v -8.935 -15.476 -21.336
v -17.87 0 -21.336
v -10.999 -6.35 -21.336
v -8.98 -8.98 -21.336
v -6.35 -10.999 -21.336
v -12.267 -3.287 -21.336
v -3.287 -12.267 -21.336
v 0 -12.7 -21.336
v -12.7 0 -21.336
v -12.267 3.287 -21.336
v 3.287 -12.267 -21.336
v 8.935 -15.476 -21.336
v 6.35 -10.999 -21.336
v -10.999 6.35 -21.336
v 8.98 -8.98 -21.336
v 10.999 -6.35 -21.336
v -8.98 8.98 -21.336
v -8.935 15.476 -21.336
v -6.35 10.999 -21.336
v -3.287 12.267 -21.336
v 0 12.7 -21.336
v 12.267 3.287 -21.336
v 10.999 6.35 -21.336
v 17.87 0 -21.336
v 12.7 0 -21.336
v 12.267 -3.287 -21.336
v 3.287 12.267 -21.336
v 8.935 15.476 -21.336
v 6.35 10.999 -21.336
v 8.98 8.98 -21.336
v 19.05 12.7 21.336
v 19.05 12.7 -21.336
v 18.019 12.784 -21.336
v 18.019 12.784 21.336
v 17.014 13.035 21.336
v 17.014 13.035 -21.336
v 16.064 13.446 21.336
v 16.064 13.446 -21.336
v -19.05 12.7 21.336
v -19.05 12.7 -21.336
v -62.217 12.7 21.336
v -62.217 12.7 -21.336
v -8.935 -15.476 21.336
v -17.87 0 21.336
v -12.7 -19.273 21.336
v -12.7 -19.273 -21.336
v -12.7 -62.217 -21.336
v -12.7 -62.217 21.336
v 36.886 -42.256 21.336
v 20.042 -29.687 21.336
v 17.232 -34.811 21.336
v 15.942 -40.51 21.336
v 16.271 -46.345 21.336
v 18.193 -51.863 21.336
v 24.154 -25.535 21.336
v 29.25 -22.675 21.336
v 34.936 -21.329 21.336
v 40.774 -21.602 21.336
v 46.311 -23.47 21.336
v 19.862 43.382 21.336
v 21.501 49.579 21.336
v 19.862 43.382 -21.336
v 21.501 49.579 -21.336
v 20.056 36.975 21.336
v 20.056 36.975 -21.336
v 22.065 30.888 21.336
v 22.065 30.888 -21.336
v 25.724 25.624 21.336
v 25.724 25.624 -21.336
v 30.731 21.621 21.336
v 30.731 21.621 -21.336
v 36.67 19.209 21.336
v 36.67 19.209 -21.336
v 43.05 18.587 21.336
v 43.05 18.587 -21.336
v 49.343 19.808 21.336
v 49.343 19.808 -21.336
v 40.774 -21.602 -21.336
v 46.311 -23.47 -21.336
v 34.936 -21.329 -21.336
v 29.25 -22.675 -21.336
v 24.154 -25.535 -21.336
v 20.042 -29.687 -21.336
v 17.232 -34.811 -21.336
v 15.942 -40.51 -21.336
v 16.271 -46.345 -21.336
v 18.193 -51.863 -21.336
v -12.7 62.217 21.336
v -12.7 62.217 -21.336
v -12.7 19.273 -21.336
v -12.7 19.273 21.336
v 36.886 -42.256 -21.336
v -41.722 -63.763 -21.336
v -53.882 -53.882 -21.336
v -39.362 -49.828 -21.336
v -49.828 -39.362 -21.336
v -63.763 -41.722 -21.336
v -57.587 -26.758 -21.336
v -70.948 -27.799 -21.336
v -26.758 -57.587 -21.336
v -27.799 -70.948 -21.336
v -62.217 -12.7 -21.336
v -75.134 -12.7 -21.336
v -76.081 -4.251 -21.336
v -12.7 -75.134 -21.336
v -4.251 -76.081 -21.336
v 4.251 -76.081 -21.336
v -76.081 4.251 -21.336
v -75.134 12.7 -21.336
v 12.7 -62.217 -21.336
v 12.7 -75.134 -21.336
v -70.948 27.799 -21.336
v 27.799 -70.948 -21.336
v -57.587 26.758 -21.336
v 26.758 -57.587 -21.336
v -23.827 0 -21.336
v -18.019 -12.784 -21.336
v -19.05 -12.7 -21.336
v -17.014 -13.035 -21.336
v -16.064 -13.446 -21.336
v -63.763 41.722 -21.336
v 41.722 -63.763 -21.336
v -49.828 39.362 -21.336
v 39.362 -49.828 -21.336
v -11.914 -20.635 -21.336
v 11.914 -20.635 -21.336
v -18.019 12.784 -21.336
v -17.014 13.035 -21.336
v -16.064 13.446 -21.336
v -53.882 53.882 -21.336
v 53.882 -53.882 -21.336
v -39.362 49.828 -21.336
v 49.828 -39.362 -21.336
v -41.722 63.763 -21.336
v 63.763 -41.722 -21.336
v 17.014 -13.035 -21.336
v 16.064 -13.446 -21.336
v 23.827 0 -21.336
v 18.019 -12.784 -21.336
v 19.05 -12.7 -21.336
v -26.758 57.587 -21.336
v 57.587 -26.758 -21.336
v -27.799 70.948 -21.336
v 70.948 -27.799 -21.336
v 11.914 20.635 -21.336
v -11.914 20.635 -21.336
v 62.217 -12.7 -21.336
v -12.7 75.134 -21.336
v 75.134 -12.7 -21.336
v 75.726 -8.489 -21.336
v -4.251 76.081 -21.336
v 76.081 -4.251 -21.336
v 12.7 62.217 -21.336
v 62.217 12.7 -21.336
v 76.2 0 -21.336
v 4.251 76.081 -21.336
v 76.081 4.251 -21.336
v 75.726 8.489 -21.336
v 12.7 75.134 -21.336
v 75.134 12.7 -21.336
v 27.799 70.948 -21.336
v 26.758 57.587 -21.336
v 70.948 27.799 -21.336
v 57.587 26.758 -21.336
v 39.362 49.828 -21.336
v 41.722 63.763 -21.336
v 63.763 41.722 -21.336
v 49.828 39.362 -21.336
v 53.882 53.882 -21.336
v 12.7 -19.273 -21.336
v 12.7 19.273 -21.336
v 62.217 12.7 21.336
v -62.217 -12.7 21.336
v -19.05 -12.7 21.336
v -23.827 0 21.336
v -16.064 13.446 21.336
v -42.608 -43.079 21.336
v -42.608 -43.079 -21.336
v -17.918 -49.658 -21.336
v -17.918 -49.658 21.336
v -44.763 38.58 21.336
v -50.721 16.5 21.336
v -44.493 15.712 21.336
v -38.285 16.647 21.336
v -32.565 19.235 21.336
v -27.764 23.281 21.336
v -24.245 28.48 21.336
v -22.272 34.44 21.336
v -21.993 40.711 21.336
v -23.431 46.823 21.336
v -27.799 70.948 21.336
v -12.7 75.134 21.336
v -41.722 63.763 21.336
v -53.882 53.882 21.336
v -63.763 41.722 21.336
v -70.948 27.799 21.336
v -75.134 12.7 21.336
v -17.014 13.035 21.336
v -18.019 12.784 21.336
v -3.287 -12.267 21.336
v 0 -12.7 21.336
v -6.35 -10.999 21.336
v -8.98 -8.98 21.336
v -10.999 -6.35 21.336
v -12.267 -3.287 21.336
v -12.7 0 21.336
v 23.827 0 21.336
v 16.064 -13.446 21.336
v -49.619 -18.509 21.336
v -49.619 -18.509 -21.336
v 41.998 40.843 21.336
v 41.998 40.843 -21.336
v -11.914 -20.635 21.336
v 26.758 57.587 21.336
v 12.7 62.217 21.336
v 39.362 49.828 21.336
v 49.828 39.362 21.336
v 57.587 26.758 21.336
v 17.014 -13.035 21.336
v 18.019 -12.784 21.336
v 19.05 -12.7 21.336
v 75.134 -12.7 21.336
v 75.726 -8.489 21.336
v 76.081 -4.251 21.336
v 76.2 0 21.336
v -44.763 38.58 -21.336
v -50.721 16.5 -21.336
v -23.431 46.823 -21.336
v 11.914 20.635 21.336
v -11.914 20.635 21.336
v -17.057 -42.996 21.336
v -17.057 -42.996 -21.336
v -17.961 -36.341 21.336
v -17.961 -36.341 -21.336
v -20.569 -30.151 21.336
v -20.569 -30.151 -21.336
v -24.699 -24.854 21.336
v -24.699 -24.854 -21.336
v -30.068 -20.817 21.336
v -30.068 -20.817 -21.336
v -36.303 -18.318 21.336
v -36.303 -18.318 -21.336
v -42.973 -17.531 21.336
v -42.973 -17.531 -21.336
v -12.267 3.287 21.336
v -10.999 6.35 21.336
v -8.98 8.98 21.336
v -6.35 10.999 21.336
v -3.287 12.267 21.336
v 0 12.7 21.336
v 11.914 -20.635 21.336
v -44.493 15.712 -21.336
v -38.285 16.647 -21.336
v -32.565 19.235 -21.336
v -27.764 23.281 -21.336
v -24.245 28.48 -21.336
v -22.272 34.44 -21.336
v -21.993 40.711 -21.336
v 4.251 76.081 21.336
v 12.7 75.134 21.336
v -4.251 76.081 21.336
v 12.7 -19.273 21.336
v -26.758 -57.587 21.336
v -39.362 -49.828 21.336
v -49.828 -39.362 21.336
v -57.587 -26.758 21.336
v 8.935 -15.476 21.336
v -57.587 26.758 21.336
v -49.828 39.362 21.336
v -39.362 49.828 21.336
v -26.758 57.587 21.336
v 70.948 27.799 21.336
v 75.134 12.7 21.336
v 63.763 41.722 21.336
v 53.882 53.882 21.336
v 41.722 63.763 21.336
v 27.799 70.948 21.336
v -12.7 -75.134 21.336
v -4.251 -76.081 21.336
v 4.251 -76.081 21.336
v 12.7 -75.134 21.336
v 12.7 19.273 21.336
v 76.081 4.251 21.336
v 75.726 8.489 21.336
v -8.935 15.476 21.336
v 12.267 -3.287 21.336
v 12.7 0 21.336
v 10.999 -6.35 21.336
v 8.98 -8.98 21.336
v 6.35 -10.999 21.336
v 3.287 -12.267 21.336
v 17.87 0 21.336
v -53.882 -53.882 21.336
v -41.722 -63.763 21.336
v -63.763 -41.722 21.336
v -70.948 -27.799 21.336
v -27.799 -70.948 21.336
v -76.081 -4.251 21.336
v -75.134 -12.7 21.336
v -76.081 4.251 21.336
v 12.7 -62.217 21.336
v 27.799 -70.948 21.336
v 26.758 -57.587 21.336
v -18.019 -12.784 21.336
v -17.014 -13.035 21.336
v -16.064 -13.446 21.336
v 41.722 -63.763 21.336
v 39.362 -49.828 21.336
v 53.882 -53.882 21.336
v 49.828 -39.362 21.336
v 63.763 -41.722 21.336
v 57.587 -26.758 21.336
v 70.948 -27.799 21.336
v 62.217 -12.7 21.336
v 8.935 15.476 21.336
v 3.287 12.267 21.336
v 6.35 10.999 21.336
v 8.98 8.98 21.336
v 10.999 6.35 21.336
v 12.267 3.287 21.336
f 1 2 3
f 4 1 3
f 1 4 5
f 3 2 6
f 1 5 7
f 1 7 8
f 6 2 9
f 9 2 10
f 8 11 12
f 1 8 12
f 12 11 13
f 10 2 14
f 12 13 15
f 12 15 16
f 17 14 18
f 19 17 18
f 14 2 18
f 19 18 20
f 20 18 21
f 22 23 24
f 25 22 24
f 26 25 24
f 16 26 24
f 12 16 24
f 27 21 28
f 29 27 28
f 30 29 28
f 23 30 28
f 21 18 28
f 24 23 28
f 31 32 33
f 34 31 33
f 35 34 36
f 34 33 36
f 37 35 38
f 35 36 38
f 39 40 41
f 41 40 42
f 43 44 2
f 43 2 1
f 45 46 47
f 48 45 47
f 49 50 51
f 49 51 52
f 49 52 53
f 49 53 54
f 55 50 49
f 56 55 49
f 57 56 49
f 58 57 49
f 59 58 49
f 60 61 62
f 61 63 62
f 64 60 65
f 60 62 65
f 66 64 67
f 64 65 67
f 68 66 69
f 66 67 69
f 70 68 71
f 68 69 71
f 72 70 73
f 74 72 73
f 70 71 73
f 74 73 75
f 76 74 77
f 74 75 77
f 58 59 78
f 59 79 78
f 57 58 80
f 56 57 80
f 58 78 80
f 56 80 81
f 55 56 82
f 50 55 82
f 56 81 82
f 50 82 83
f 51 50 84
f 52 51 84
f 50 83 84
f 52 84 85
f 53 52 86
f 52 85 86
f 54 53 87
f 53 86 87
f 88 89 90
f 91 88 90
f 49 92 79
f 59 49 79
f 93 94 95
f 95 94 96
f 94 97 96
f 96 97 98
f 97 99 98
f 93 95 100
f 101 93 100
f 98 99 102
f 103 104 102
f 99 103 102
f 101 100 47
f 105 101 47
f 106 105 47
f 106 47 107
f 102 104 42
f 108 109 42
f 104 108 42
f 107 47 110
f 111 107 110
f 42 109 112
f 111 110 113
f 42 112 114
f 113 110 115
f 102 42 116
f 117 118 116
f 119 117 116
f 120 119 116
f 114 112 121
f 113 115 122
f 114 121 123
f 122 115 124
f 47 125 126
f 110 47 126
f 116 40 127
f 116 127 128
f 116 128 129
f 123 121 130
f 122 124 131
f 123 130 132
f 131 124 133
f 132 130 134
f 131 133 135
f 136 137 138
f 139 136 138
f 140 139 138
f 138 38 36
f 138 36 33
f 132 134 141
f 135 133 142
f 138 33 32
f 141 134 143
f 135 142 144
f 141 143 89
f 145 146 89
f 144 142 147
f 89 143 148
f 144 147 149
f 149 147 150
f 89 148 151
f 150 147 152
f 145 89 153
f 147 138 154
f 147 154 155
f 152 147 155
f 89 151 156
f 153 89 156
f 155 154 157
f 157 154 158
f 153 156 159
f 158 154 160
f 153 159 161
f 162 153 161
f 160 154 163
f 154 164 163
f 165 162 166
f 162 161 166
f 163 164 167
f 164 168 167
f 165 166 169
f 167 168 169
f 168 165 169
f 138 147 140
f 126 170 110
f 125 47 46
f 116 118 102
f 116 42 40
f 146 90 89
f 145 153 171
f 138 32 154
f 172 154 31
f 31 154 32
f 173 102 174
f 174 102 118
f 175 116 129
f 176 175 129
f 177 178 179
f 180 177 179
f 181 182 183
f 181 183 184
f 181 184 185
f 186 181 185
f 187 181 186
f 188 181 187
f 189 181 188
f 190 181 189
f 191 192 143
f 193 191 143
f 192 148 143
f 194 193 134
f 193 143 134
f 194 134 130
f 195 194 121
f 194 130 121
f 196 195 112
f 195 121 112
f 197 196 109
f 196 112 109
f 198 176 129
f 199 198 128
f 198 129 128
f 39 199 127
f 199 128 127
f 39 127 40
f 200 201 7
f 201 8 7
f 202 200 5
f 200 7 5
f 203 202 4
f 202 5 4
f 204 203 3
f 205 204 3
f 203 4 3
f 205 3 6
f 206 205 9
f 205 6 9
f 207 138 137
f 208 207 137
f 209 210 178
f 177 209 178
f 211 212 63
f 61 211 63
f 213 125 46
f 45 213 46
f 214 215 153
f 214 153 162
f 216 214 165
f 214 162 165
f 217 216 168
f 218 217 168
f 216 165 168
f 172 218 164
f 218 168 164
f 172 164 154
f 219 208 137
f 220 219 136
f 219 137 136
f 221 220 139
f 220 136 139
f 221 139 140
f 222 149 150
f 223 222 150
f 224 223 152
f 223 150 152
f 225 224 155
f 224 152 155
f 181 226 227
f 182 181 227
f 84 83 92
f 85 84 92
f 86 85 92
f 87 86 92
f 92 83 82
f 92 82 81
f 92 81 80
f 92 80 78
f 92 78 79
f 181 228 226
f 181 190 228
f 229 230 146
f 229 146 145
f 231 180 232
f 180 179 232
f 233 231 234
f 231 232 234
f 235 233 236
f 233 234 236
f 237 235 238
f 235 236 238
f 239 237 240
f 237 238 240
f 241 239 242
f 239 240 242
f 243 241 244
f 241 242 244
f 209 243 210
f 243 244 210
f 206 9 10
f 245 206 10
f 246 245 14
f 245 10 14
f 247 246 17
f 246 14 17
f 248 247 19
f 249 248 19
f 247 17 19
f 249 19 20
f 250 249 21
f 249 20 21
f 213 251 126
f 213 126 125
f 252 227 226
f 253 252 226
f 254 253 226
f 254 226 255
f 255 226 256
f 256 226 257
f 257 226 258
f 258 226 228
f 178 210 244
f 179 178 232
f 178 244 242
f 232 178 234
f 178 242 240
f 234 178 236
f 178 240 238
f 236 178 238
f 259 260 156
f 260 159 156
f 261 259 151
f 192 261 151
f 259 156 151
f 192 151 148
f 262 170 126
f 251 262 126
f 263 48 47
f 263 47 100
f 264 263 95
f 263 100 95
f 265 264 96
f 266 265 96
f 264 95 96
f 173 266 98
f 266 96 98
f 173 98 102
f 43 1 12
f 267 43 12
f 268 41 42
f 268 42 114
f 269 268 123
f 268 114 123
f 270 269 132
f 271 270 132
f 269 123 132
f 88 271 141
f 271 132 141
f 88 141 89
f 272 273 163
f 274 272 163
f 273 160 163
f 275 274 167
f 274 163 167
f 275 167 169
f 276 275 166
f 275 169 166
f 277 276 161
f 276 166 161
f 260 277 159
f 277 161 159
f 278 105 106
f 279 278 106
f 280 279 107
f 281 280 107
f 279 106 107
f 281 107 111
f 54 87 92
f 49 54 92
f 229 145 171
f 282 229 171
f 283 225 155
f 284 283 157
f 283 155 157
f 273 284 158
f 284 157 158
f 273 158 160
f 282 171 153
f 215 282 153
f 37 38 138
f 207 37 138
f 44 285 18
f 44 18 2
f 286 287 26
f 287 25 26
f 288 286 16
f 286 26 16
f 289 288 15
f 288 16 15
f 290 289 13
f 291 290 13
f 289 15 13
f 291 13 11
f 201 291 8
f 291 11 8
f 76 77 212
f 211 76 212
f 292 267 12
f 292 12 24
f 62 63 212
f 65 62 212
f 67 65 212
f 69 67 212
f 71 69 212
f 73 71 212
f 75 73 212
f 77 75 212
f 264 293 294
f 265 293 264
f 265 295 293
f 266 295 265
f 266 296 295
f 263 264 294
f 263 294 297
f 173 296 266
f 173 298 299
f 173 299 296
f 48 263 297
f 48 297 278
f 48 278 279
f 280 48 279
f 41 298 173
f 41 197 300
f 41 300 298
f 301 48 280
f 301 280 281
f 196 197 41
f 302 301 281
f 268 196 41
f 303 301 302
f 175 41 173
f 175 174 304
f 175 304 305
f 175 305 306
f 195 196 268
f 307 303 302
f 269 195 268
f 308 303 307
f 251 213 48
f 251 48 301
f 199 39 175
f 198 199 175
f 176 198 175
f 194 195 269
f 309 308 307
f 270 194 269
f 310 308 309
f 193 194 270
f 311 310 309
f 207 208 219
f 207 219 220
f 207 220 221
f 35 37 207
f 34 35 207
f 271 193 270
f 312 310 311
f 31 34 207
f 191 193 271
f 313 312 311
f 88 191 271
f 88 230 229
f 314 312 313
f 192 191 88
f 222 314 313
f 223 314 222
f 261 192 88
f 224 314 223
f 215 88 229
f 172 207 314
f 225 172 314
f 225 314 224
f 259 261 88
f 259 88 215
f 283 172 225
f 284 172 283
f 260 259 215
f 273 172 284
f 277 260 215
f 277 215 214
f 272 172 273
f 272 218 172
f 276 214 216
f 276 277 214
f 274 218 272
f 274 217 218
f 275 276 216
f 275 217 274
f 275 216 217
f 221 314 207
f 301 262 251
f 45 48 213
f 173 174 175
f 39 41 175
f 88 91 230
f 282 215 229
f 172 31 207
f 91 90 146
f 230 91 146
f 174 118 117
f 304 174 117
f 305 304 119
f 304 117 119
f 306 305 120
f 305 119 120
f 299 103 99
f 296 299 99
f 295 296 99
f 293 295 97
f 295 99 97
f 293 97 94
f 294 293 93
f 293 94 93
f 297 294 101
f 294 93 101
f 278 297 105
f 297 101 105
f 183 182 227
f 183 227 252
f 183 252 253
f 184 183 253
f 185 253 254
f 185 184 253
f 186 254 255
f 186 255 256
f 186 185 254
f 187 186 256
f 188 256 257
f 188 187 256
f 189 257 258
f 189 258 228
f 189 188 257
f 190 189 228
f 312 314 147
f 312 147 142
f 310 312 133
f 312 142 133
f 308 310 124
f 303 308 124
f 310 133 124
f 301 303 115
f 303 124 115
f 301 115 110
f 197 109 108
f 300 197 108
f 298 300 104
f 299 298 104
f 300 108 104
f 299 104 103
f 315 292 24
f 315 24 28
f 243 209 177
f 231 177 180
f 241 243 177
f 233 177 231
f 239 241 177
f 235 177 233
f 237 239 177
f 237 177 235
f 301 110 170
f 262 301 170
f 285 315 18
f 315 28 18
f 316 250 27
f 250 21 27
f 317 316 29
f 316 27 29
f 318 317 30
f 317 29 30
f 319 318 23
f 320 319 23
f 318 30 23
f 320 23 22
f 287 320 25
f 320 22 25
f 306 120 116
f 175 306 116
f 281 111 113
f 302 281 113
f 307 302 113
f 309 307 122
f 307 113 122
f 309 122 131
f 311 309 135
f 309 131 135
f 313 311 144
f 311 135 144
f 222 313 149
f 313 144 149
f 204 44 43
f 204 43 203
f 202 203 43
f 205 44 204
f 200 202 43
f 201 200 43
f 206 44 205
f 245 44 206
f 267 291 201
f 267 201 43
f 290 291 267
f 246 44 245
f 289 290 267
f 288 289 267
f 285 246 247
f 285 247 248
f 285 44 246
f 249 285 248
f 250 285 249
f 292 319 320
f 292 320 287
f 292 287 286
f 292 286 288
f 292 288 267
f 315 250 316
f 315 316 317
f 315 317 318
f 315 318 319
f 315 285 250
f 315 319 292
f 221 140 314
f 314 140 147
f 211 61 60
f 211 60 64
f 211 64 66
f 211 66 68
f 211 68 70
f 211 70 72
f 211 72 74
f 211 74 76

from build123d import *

# Parameters (mm, degrees)
F1_DEPTH = 21.336


with BuildPart() as f1:
    # F0 (on Top) → F1 (new body, symmetric)
    with BuildSketch(Plane.XY):
        with BuildLine():
            ThreePointArc((75.134213, -12.7), (75.933086, -6.372321), (76.2, 0))
            ThreePointArc((76.2, 0), (75.933086, 6.372321), (75.134213, 12.7))
            ThreePointArc((75.134213, 12.7), (53.881537, 53.881537), (12.7, 75.134213))
            ThreePointArc((12.7, 75.134213), (0, 76.2), (-12.7, 75.134213))
            ThreePointArc((-12.7, 75.134213), (-53.881537, 53.881537), (-75.134213, 12.7))
            ThreePointArc((-75.134213, 12.7), (-76.2, 0), (-75.134213, -12.7))
            ThreePointArc((-75.134213, -12.7), (-53.881537, -53.881537), (-12.7, -75.134213))
            ThreePointArc((-12.7, -75.134213), (0, -76.2), (12.7, -75.134213))
            ThreePointArc((12.7, -75.134213), (53.881537, -53.881537), (75.134213, -12.7))
        make_face()
        with BuildLine():
            ThreePointArc((62.217039, -12.7), (44.901281, -44.901281), (12.7, -62.217039))
            Line((12.7, -62.217039), (12.7, -19.273037))
            Line((12.7, -19.273037), (11.913647, -20.635041))
            Line((11.913647, -20.635041), (0, -20.635041))
            Line((0, -20.635041), (-11.913647, -20.635041))
            Line((-11.913647, -20.635041), (-12.7, -19.273037))
            Line((-12.7, -19.273037), (-12.7, -62.217039))
            ThreePointArc((-12.7, -62.217039), (-44.901281, -44.901281), (-62.217039, -12.7))
            Line((-62.217039, -12.7), (-19.05, -12.7))
            ThreePointArc((-19.05, -12.7), (-17.51138, -12.889225), (-16.064459, -13.445623))
            Line((-16.064459, -13.445623), (-23.827293, 0))
            Line((-23.827293, 0), (-16.064459, 13.445623))
            ThreePointArc((-16.064459, 13.445623), (-17.51138, 12.889225), (-19.05, 12.7))
            Line((-19.05, 12.7), (-62.217039, 12.7))
            ThreePointArc((-62.217039, 12.7), (-44.901281, 44.901281), (-12.7, 62.217039))
            Line((-12.7, 62.217039), (-12.7, 19.273037))
            Line((-12.7, 19.273037), (-11.913647, 20.635041))
            Line((-11.913647, 20.635041), (11.913647, 20.635041))
            Line((11.913647, 20.635041), (12.7, 19.273037))
            Line((12.7, 19.273037), (12.7, 62.217039))
            ThreePointArc((12.7, 62.217039), (44.901281, 44.901281), (62.217039, 12.7))
            Line((62.217039, 12.7), (19.05, 12.7))
            ThreePointArc((19.05, 12.7), (17.51138, 12.889225), (16.064459, 13.445623))
            Line((16.064459, 13.445623), (23.827293, 0))
            Line((23.827293, 0), (16.064459, -13.445623))
            ThreePointArc((16.064459, -13.445623), (17.51138, -12.889225), (19.05, -12.7))
            Line((19.05, -12.7), (62.217039, -12.7))
        make_face(mode=Mode.SUBTRACT)
        with BuildLine():
            Line((8.935235, -15.476281), (17.87047, 0))
            Line((17.87047, 0), (12.7, 0))
            ThreePointArc((12.7, 0), (8.980256, -8.980256), (0, -12.7))
            Line((0, -12.7), (0, -15.476281))
            Line((0, -15.476281), (8.935235, -15.476281))
        make_face()
        with BuildLine():
            Line((12.7, 0), (17.87047, 0))
            Line((17.87047, 0), (8.935235, 15.476281))
            Line((8.935235, 15.476281), (-8.935235, 15.476281))
            Line((-8.935235, 15.476281), (-17.87047, 0))
            Line((-17.87047, 0), (-12.7, 0))
            ThreePointArc((-12.7, 0), (-8.980256, 8.980256), (0, 12.7))
            ThreePointArc((0, 12.7), (8.980256, 8.980256), (12.7, 0))
        make_face()
        with BuildLine():
            Line((-8.935235, -15.476281), (0, -15.476281))
            Line((0, -15.476281), (0, -12.7))
            ThreePointArc((0, -12.7), (-8.980256, -8.980256), (-12.7, 0))
            Line((-12.7, 0), (-17.87047, 0))
            Line((-17.87047, 0), (-8.935235, -15.476281))
        make_face()
        with BuildLine():
            Line((-42.607927, -43.079422), (-17.91783, -49.657986))
            ThreePointArc((-17.91783, -49.657986), (-24.699476, -24.854007), (-49.618606, -18.508529))
            Line((-49.618606, -18.508529), (-42.607927, -43.079422))
        make_face()
        with BuildLine():
            Line((36.886193, -42.255931), (46.310697, -23.470389))
            ThreePointArc((46.310697, -23.470389), (21.952552, -27.467278), (18.193489, -51.863257))
            Line((18.193489, -51.863257), (36.886193, -42.255931))
        make_face()
        with BuildLine():
            Line((41.997657, 40.84294), (21.501394, 49.579222))
            ThreePointArc((21.501394, 49.579222), (25.724442, 25.624469), (49.342945, 19.808061))
            Line((49.342945, 19.808061), (41.997657, 40.84294))
        make_face()
        with BuildLine():
            Line((-44.763004, 38.579587), (-50.721239, 16.500155))
            ThreePointArc((-50.721239, 16.500155), (-27.764434, 23.280876), (-23.431009, 46.822637))
            Line((-23.431009, 46.822637), (-44.763004, 38.579587))
        make_face()
    extrude(amount=F1_DEPTH, both=True)


solid = f1.part
